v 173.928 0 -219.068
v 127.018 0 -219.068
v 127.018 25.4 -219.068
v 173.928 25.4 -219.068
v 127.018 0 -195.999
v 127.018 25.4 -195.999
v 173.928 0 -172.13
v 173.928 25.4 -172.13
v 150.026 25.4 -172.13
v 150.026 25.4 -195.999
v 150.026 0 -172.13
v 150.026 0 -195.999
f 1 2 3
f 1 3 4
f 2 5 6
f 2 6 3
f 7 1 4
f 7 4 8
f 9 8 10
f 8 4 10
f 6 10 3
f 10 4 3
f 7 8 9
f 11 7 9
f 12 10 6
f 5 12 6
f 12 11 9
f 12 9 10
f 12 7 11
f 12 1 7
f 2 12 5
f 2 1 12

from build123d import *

# Parameters (mm, degrees)
BOSS_EXTRUDE1_DEPTH     = 25.4
BOSS_EXTRUDE1_2_DEPTH   = 25.4
CUT_EXTRUDE1_DEPTH      = 281.867791968
CUT_EXTRUDE1_DEPTH_BACK = 281.867791968
SKETCH2_OUTSIDE_W       = 232.096
SKETCH2_OUTSIDE_H       = 277.199
SKETCH2_OUTSIDE_W_2     = 46.910236734
SKETCH2_OUTSIDE_H_2     = 46.937556504


with BuildPart() as part:
    # Sketch1 → Boss-Extrude1 (new body)
    with BuildSketch(Plane(origin=(0, 0, 0), x_dir=(1, 0, 0), z_dir=(0, 1, 0))):
        with BuildLine():
            Line((0, 80.02759766), (0, 219.067642019))
            Line((0, 219.067642019), (103.040086398, 219.067642019))
            Line((103.040086398, 219.067642019), (103.040086398, 195.999460881))
            Line((103.040086398, 195.999460881), (23.011829096, 195.999460881))
            Line((23.011829096, 195.999460881), (23.011829096, 161.013213822))
            ThreePointArc((23.011829096, 161.013213822), (101.985495584, 126.901824422), (136.744902109, 48.211224327))
            ThreePointArc((136.744902109, 48.211224327), (146.280346481, 62.911008862), (150.026111113, 80.02759766))
            Line((150.026111113, 80.02759766), (150.026111113, 148.011746996))
            Line((150.026111113, 148.011746996), (172.974333949, 148.011746996))
            Line((172.974333949, 148.011746996), (172.974333949, 80.02759766))
            ThreePointArc((172.974333949, 80.02759766), (86.487166974, 0.037389651), (0, 80.02759766))
        make_face()
        with BuildLine():
            Line((23.011829096, 136.058182002), (23.011829096, 80.02759766))
            ThreePointArc((23.011829096, 80.02759766), (54.48283159, 31.69310754), (112.066438029, 28.410547154))
            ThreePointArc((112.066438029, 28.410547154), (90.841729512, 101.512108787), (23.011829096, 136.058182002))
        make_face(mode=Mode.SUBTRACT)
    extrude(amount=BOSS_EXTRUDE1_DEPTH)

    # Sketch2 outside → Cut-Extrude1 (cut, two sides: drawn at the far end of the back side and taken through both)
    with BuildSketch(Plane(origin=(0, 25.4, 0), x_dir=(1, 0, 0), z_dir=(0, 1, 0)).offset(-CUT_EXTRUDE1_DEPTH_BACK)):
        with Locations((86.964, 109.5525)):
            Rectangle(SKETCH2_OUTSIDE_W, SKETCH2_OUTSIDE_H)
        with Locations((150.472811492, 195.598863767)):
            Rectangle(SKETCH2_OUTSIDE_W_2, SKETCH2_OUTSIDE_H_2, mode=Mode.SUBTRACT)
    extrude(amount=CUT_EXTRUDE1_DEPTH + CUT_EXTRUDE1_DEPTH_BACK, mode=Mode.SUBTRACT)


with BuildPart() as body_2:
    # Sketch1 → Boss-Extrude1 2 (new body)
    with BuildSketch(Plane(origin=(0, 0, 0), x_dir=(1, 0, 0), z_dir=(0, 1, 0))):
        Polygon((173.927929859, 172.130085515), (150.026111113, 172.130085515), (150.026111113, 195.999460881), (127.017693125, 195.999460881), (127.017693125, 219.067642019), (173.927929859, 219.067642019), align=None)
    extrude(amount=BOSS_EXTRUDE1_2_DEPTH)


solid = body_2.part
